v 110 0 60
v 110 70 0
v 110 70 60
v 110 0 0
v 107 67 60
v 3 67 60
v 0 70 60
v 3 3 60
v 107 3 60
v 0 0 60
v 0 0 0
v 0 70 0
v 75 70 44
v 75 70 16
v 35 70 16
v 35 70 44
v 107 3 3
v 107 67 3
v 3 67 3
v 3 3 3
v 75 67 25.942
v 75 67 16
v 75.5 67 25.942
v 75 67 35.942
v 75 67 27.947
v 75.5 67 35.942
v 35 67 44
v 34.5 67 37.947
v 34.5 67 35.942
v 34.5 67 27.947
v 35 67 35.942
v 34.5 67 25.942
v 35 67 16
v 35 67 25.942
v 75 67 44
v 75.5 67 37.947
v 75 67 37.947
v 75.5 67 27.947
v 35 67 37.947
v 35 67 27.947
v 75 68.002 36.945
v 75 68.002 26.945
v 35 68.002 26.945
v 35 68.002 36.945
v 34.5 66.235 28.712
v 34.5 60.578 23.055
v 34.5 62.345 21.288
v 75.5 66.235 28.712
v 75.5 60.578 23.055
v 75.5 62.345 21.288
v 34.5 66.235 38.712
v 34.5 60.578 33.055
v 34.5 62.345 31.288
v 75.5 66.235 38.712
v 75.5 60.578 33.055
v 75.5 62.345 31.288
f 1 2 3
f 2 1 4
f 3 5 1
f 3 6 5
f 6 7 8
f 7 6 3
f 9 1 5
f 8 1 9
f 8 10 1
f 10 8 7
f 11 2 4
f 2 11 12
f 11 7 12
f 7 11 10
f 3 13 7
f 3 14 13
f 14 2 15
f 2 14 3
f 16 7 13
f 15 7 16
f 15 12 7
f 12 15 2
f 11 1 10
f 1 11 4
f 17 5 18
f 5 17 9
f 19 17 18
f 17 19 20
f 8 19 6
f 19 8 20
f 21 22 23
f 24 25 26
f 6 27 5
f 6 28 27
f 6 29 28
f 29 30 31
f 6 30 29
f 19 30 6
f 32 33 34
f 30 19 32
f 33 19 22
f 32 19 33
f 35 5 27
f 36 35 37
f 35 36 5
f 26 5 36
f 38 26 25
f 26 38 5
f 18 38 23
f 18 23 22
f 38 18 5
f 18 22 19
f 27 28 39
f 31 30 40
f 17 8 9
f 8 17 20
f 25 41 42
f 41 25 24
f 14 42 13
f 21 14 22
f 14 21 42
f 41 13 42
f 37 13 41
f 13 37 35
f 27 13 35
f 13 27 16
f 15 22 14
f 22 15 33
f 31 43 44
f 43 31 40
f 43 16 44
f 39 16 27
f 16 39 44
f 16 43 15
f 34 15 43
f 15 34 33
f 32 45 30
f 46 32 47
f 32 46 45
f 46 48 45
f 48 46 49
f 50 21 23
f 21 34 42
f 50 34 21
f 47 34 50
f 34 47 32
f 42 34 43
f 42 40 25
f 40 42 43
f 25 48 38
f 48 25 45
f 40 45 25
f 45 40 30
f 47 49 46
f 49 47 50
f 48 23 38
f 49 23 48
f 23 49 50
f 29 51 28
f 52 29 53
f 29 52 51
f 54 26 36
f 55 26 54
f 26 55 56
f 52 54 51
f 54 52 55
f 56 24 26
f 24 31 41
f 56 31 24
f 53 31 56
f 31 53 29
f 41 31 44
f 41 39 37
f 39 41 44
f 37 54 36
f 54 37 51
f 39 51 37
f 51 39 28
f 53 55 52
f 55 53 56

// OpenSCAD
$fn = 32;

// ----------------------------------------------------------------------
// Vent box: louvers enclosure
// ----------------------------------------------------------------------

// --- parameters (mm) ---
box_l = 110;              // box length, X
box_w = 70;               // box width, Y
box_h = 60;               // box height, Z
wall_t = 3;               // shell wall thickness
win_l = 40;               // vent window width, X
win_h = 28;               // vent window height, Z
slat_t = 2.5;             // louver slat thickness
slat_d = 8;               // louver slat depth
slat_a = 45;              // louver slat angle, degrees
slat_pitch = 10;          // louver pitch
slat_yc = 64.29;          // slat centreline Y

win_z0 = (box_h - win_h) / 2;  // window lower edge Z
n_slats = 2;  // louver count
slat_z0 = win_z0 + (win_h - (n_slats - 1) * slat_pitch) / 2;

difference() {
  union() {
    difference() {
      cube([box_l, box_w, box_h]);
  translate([wall_t, wall_t, wall_t])
    cube([box_l - 2 * wall_t, box_w - 2 * wall_t, box_h]);
  translate([(box_l - win_l) / 2, box_w - wall_t - 1, win_z0])
    cube([win_l, wall_t + 2, win_h]);
    }
    for (i = [0 : n_slats - 1])
      translate([box_l / 2, slat_yc, slat_z0 + i * slat_pitch])
        rotate([slat_a, 0, 0])
          cube([win_l + 1, slat_d, slat_t], center = true);
  }
}
